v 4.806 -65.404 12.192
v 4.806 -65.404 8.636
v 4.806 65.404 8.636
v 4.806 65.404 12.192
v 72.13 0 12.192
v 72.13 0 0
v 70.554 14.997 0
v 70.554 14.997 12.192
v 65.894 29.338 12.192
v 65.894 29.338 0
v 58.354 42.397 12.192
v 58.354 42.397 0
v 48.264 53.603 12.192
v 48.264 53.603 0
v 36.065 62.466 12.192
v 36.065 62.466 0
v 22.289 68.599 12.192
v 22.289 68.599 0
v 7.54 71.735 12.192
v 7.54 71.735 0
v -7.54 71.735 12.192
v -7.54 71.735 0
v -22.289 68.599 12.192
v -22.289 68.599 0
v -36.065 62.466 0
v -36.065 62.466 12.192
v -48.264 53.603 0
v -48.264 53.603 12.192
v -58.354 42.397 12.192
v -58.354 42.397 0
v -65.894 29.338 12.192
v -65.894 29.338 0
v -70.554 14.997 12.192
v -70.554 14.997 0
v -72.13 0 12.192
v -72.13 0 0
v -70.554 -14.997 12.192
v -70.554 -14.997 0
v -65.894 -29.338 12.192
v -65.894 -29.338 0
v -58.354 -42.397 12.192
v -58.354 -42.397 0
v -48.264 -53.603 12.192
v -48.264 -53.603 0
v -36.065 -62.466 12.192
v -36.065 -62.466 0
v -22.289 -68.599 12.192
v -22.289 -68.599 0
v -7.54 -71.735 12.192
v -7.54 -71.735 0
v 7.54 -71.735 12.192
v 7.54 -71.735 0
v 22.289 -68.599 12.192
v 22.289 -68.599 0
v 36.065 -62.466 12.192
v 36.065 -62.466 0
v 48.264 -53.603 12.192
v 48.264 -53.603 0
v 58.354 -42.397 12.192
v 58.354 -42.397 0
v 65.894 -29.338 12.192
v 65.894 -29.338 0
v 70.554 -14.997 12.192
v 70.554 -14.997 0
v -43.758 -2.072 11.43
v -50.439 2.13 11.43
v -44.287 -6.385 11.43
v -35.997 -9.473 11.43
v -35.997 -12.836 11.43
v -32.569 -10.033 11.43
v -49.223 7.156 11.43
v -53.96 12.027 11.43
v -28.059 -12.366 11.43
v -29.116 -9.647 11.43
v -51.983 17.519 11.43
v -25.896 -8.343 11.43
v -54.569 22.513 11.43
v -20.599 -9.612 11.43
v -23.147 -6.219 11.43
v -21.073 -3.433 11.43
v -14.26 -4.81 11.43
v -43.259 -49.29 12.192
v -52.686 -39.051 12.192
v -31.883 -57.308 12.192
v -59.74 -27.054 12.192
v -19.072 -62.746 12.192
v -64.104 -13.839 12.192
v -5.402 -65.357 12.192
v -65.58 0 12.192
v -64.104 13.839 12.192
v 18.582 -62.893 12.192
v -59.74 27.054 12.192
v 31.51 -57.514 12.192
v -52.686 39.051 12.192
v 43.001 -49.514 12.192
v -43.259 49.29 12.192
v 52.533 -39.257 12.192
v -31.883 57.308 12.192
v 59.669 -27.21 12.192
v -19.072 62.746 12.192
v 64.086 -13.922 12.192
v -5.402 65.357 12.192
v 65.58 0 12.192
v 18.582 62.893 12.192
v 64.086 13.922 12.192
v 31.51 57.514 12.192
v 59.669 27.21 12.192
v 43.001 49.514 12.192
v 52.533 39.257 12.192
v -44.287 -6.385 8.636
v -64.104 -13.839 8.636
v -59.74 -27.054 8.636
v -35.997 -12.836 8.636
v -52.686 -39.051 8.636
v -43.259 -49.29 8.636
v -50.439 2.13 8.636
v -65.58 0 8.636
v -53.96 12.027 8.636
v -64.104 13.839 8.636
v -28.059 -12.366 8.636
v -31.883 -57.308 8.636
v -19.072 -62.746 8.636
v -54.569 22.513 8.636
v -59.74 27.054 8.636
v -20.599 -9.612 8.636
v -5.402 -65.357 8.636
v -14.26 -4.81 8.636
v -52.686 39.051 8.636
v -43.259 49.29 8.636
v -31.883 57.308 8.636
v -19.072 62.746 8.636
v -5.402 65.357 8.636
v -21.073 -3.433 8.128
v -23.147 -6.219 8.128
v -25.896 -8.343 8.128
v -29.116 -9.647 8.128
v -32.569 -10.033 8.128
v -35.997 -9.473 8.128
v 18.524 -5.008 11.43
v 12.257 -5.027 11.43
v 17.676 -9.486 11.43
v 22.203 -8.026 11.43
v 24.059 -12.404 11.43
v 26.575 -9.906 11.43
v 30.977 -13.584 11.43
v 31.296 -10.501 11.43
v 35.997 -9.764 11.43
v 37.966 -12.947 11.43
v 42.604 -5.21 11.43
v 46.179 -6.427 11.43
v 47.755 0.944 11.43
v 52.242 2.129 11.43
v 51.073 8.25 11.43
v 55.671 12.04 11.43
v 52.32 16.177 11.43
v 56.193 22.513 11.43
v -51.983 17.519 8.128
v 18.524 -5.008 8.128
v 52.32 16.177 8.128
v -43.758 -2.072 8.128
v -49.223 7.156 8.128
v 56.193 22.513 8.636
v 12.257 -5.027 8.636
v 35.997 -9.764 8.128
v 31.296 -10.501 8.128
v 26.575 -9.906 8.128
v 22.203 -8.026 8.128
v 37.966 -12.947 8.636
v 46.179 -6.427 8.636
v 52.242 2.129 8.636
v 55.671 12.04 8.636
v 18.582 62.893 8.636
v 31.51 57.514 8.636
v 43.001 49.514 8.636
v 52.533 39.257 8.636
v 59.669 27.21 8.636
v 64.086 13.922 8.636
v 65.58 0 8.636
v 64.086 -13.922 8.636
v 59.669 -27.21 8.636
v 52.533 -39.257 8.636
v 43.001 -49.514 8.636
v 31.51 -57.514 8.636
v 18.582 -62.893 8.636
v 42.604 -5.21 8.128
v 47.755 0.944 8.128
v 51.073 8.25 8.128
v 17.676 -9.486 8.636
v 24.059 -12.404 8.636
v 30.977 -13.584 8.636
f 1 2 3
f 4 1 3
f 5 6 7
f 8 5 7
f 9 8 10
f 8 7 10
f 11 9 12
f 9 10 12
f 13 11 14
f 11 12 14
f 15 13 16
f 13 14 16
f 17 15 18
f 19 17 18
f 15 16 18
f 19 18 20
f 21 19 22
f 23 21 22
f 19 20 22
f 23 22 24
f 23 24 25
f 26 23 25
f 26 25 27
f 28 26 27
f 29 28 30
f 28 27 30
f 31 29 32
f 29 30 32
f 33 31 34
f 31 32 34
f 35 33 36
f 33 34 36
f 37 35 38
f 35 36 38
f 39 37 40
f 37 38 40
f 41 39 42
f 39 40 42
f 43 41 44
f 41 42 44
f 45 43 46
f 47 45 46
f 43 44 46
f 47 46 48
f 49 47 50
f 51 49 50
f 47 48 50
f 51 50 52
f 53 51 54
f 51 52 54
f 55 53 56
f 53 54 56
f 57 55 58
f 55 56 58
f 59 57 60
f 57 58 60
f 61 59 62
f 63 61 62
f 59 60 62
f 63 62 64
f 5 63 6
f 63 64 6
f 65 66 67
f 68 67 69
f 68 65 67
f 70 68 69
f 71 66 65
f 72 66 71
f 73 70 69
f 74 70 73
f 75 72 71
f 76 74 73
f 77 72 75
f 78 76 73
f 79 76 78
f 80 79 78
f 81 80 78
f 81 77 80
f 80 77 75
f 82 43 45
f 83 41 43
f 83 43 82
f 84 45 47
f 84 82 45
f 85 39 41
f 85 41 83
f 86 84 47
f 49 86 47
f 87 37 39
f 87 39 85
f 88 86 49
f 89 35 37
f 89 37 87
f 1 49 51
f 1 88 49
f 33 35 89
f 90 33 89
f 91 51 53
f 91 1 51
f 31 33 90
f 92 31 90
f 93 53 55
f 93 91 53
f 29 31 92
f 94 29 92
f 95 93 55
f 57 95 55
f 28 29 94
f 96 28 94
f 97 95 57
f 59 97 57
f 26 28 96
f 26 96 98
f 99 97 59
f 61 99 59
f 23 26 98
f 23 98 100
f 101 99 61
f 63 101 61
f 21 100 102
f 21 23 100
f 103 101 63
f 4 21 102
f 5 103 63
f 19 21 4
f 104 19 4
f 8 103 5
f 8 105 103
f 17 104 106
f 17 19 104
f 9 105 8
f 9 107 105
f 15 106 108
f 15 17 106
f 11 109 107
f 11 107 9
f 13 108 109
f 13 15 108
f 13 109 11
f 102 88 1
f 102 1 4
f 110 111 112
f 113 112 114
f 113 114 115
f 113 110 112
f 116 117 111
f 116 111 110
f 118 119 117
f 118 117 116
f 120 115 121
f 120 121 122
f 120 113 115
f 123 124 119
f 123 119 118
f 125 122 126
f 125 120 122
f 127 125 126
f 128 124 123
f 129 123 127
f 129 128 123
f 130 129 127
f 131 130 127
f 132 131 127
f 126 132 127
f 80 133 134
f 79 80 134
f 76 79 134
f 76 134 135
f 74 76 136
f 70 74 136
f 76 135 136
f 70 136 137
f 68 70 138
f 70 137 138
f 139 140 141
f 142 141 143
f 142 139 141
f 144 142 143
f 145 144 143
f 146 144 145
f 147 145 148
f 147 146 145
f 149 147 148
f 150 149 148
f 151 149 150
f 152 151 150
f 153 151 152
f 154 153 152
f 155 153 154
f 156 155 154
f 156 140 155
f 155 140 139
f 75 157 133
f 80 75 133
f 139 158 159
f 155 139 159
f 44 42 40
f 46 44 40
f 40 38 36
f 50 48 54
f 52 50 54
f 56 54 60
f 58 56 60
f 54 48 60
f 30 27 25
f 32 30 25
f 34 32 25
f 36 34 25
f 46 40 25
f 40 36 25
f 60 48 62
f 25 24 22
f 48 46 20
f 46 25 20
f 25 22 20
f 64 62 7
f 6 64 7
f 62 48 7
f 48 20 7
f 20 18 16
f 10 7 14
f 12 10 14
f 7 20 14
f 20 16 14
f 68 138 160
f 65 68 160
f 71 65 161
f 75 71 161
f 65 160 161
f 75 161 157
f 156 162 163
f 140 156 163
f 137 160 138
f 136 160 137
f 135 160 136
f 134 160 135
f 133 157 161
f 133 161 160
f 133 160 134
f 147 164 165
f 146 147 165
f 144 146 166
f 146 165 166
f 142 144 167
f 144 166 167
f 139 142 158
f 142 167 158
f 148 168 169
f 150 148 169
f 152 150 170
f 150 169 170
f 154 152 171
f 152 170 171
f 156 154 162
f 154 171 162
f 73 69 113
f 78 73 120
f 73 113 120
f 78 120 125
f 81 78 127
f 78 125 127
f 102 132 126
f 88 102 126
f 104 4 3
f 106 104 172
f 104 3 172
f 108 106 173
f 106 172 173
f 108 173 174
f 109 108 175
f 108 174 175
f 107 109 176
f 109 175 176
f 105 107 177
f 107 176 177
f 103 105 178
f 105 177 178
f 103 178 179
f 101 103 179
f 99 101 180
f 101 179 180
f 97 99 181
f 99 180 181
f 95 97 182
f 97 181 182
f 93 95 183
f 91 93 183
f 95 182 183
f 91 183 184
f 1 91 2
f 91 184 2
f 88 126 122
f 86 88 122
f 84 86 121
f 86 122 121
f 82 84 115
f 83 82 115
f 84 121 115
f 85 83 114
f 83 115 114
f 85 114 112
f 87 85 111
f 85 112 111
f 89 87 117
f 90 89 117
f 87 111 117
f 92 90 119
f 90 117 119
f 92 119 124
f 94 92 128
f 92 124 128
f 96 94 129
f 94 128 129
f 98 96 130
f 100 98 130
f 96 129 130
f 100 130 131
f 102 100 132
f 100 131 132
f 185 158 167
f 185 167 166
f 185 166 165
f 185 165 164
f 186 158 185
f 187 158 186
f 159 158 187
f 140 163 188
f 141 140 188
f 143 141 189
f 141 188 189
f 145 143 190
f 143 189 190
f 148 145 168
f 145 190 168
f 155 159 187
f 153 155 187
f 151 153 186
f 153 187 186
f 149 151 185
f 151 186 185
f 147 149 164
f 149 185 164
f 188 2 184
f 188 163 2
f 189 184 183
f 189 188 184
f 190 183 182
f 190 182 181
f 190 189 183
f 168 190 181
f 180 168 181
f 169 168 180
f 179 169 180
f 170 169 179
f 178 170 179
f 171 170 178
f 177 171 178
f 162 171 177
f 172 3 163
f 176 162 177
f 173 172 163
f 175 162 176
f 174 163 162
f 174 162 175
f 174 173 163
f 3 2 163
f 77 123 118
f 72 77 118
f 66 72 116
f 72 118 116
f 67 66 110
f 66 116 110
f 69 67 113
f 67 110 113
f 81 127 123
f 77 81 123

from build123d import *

# Parameters (mm, degrees)
F0_R     = 72.129712
F1_DEPTH = 12.192
F2_DEPTH = 8.636
F3_DEPTH = 11.43
F4_DEPTH = 8.128


with BuildPart() as f1:
    # F0 (on Top) → F1 (new body)
    with BuildSketch(Plane.XY):
        Circle(F0_R)
        with BuildLine():
            ThreePointArc((4.806476, 65.403976), (48.04161, 44.640631), (65.580349, 0))
            ThreePointArc((65.580349, 0), (48.04161, -44.640631), (4.806476, -65.403976))
            ThreePointArc((4.806476, -65.403976), (-0.298713, -65.579669), (-5.40209, -65.357476))
            ThreePointArc((-5.40209, -65.357476), (-65.580349, 0), (-5.40209, 65.357476))
            ThreePointArc((-5.40209, 65.357476), (-0.298713, 65.579669), (4.806476, 65.403976))
        make_face(mode=Mode.SUBTRACT)
        with BuildLine():
            Line((4.806476, -65.403976), (4.806476, 65.403976))
            ThreePointArc((4.806476, 65.403976), (-0.298713, 65.579669), (-5.40209, 65.357476))
            Line((-5.40209, 65.357476), (-5.40209, -65.357476))
            ThreePointArc((-5.40209, -65.357476), (-0.298713, -65.579669), (4.806476, -65.403976))
        make_face()
    extrude(amount=F1_DEPTH)

    # F0 (on Top) → F2 (join)
    with BuildSketch(Plane.XY):
        with BuildLine():
            Line((-5.40209, -65.357476), (-5.40209, 65.357476))
            ThreePointArc((-5.40209, 65.357476), (-65.580349, 0), (-5.40209, -65.357476))
        make_face()
        with BuildLine():
            ThreePointArc((-35.997212, -12.835954), (-50.439117, 2.12982), (-54.568859, 22.513349))
            Line((-54.568859, 22.513349), (-14.25985, -4.810002))
            ThreePointArc((-14.25985, -4.810002), (-24.227117, -11.264353), (-35.997212, -12.835954))
        make_face(mode=Mode.SUBTRACT)
        with BuildLine():
            ThreePointArc((4.806476, -65.403976), (48.04161, -44.640631), (65.580349, 0))
            ThreePointArc((65.580349, 0), (48.04161, 44.640631), (4.806476, 65.403976))
            Line((4.806476, 65.403976), (4.806476, -65.403976))
        make_face()
        with BuildLine():
            ThreePointArc((37.965938, -12.946998), (24.058988, -12.403736), (12.256999, -5.027325))
            Line((12.256999, -5.027325), (56.192723, 22.513349))
            ThreePointArc((56.192723, 22.513349), (52.24232, 2.129374), (37.965938, -12.946998))
        make_face(mode=Mode.SUBTRACT)
    extrude(amount=F2_DEPTH)

    # F0 (on Top) → F3 (join)
    with BuildSketch(Plane.XY):
        with BuildLine():
            Line((-14.25985, -4.810002), (-54.568859, 22.513349))
            ThreePointArc((-54.568859, 22.513349), (-50.439117, 2.12982), (-35.997212, -12.835954))
            ThreePointArc((-35.997212, -12.835954), (-24.227117, -11.264353), (-14.25985, -4.810002))
        make_face()
        with BuildLine():
            ThreePointArc((-35.997212, -9.472951), (-46.80737, 2.354515), (-51.982607, 17.519125))
            Line((-51.982607, 17.519125), (-21.073241, -3.432703))
            ThreePointArc((-21.073241, -3.432703), (-27.461786, -9.105034), (-35.997212, -9.472951))
        make_face(mode=Mode.SUBTRACT)
        with BuildLine():
            Line((56.192723, 22.513349), (12.256999, -5.027325))
            ThreePointArc((12.256999, -5.027325), (24.058988, -12.403736), (37.965938, -12.946998))
            ThreePointArc((37.965938, -12.946998), (52.24232, 2.129374), (56.192723, 22.513349))
        make_face()
        with BuildLine():
            Line((18.524186, -5.007584), (52.319836, 16.176885))
            ThreePointArc((52.319836, 16.176885), (47.754564, 0.943554), (35.997216, -9.764426))
            ThreePointArc((35.997216, -9.764426), (26.574656, -9.906012), (18.524186, -5.007584))
        make_face(mode=Mode.SUBTRACT)
    extrude(amount=F3_DEPTH)

    # F0 (on Top) → F4 (join)
    with BuildSketch(Plane.XY):
        with BuildLine():
            Line((-21.073241, -3.432703), (-51.982607, 17.519125))
            ThreePointArc((-51.982607, 17.519125), (-46.80737, 2.354515), (-35.997212, -9.472951))
            ThreePointArc((-35.997212, -9.472951), (-27.461786, -9.105034), (-21.073241, -3.432703))
        make_face()
        with BuildLine():
            ThreePointArc((35.997216, -9.764426), (47.754564, 0.943554), (52.319836, 16.176885))
            Line((52.319836, 16.176885), (18.524186, -5.007584))
            ThreePointArc((18.524186, -5.007584), (26.574656, -9.906012), (35.997216, -9.764426))
        make_face()
    extrude(amount=F4_DEPTH)


solid = f1.part
